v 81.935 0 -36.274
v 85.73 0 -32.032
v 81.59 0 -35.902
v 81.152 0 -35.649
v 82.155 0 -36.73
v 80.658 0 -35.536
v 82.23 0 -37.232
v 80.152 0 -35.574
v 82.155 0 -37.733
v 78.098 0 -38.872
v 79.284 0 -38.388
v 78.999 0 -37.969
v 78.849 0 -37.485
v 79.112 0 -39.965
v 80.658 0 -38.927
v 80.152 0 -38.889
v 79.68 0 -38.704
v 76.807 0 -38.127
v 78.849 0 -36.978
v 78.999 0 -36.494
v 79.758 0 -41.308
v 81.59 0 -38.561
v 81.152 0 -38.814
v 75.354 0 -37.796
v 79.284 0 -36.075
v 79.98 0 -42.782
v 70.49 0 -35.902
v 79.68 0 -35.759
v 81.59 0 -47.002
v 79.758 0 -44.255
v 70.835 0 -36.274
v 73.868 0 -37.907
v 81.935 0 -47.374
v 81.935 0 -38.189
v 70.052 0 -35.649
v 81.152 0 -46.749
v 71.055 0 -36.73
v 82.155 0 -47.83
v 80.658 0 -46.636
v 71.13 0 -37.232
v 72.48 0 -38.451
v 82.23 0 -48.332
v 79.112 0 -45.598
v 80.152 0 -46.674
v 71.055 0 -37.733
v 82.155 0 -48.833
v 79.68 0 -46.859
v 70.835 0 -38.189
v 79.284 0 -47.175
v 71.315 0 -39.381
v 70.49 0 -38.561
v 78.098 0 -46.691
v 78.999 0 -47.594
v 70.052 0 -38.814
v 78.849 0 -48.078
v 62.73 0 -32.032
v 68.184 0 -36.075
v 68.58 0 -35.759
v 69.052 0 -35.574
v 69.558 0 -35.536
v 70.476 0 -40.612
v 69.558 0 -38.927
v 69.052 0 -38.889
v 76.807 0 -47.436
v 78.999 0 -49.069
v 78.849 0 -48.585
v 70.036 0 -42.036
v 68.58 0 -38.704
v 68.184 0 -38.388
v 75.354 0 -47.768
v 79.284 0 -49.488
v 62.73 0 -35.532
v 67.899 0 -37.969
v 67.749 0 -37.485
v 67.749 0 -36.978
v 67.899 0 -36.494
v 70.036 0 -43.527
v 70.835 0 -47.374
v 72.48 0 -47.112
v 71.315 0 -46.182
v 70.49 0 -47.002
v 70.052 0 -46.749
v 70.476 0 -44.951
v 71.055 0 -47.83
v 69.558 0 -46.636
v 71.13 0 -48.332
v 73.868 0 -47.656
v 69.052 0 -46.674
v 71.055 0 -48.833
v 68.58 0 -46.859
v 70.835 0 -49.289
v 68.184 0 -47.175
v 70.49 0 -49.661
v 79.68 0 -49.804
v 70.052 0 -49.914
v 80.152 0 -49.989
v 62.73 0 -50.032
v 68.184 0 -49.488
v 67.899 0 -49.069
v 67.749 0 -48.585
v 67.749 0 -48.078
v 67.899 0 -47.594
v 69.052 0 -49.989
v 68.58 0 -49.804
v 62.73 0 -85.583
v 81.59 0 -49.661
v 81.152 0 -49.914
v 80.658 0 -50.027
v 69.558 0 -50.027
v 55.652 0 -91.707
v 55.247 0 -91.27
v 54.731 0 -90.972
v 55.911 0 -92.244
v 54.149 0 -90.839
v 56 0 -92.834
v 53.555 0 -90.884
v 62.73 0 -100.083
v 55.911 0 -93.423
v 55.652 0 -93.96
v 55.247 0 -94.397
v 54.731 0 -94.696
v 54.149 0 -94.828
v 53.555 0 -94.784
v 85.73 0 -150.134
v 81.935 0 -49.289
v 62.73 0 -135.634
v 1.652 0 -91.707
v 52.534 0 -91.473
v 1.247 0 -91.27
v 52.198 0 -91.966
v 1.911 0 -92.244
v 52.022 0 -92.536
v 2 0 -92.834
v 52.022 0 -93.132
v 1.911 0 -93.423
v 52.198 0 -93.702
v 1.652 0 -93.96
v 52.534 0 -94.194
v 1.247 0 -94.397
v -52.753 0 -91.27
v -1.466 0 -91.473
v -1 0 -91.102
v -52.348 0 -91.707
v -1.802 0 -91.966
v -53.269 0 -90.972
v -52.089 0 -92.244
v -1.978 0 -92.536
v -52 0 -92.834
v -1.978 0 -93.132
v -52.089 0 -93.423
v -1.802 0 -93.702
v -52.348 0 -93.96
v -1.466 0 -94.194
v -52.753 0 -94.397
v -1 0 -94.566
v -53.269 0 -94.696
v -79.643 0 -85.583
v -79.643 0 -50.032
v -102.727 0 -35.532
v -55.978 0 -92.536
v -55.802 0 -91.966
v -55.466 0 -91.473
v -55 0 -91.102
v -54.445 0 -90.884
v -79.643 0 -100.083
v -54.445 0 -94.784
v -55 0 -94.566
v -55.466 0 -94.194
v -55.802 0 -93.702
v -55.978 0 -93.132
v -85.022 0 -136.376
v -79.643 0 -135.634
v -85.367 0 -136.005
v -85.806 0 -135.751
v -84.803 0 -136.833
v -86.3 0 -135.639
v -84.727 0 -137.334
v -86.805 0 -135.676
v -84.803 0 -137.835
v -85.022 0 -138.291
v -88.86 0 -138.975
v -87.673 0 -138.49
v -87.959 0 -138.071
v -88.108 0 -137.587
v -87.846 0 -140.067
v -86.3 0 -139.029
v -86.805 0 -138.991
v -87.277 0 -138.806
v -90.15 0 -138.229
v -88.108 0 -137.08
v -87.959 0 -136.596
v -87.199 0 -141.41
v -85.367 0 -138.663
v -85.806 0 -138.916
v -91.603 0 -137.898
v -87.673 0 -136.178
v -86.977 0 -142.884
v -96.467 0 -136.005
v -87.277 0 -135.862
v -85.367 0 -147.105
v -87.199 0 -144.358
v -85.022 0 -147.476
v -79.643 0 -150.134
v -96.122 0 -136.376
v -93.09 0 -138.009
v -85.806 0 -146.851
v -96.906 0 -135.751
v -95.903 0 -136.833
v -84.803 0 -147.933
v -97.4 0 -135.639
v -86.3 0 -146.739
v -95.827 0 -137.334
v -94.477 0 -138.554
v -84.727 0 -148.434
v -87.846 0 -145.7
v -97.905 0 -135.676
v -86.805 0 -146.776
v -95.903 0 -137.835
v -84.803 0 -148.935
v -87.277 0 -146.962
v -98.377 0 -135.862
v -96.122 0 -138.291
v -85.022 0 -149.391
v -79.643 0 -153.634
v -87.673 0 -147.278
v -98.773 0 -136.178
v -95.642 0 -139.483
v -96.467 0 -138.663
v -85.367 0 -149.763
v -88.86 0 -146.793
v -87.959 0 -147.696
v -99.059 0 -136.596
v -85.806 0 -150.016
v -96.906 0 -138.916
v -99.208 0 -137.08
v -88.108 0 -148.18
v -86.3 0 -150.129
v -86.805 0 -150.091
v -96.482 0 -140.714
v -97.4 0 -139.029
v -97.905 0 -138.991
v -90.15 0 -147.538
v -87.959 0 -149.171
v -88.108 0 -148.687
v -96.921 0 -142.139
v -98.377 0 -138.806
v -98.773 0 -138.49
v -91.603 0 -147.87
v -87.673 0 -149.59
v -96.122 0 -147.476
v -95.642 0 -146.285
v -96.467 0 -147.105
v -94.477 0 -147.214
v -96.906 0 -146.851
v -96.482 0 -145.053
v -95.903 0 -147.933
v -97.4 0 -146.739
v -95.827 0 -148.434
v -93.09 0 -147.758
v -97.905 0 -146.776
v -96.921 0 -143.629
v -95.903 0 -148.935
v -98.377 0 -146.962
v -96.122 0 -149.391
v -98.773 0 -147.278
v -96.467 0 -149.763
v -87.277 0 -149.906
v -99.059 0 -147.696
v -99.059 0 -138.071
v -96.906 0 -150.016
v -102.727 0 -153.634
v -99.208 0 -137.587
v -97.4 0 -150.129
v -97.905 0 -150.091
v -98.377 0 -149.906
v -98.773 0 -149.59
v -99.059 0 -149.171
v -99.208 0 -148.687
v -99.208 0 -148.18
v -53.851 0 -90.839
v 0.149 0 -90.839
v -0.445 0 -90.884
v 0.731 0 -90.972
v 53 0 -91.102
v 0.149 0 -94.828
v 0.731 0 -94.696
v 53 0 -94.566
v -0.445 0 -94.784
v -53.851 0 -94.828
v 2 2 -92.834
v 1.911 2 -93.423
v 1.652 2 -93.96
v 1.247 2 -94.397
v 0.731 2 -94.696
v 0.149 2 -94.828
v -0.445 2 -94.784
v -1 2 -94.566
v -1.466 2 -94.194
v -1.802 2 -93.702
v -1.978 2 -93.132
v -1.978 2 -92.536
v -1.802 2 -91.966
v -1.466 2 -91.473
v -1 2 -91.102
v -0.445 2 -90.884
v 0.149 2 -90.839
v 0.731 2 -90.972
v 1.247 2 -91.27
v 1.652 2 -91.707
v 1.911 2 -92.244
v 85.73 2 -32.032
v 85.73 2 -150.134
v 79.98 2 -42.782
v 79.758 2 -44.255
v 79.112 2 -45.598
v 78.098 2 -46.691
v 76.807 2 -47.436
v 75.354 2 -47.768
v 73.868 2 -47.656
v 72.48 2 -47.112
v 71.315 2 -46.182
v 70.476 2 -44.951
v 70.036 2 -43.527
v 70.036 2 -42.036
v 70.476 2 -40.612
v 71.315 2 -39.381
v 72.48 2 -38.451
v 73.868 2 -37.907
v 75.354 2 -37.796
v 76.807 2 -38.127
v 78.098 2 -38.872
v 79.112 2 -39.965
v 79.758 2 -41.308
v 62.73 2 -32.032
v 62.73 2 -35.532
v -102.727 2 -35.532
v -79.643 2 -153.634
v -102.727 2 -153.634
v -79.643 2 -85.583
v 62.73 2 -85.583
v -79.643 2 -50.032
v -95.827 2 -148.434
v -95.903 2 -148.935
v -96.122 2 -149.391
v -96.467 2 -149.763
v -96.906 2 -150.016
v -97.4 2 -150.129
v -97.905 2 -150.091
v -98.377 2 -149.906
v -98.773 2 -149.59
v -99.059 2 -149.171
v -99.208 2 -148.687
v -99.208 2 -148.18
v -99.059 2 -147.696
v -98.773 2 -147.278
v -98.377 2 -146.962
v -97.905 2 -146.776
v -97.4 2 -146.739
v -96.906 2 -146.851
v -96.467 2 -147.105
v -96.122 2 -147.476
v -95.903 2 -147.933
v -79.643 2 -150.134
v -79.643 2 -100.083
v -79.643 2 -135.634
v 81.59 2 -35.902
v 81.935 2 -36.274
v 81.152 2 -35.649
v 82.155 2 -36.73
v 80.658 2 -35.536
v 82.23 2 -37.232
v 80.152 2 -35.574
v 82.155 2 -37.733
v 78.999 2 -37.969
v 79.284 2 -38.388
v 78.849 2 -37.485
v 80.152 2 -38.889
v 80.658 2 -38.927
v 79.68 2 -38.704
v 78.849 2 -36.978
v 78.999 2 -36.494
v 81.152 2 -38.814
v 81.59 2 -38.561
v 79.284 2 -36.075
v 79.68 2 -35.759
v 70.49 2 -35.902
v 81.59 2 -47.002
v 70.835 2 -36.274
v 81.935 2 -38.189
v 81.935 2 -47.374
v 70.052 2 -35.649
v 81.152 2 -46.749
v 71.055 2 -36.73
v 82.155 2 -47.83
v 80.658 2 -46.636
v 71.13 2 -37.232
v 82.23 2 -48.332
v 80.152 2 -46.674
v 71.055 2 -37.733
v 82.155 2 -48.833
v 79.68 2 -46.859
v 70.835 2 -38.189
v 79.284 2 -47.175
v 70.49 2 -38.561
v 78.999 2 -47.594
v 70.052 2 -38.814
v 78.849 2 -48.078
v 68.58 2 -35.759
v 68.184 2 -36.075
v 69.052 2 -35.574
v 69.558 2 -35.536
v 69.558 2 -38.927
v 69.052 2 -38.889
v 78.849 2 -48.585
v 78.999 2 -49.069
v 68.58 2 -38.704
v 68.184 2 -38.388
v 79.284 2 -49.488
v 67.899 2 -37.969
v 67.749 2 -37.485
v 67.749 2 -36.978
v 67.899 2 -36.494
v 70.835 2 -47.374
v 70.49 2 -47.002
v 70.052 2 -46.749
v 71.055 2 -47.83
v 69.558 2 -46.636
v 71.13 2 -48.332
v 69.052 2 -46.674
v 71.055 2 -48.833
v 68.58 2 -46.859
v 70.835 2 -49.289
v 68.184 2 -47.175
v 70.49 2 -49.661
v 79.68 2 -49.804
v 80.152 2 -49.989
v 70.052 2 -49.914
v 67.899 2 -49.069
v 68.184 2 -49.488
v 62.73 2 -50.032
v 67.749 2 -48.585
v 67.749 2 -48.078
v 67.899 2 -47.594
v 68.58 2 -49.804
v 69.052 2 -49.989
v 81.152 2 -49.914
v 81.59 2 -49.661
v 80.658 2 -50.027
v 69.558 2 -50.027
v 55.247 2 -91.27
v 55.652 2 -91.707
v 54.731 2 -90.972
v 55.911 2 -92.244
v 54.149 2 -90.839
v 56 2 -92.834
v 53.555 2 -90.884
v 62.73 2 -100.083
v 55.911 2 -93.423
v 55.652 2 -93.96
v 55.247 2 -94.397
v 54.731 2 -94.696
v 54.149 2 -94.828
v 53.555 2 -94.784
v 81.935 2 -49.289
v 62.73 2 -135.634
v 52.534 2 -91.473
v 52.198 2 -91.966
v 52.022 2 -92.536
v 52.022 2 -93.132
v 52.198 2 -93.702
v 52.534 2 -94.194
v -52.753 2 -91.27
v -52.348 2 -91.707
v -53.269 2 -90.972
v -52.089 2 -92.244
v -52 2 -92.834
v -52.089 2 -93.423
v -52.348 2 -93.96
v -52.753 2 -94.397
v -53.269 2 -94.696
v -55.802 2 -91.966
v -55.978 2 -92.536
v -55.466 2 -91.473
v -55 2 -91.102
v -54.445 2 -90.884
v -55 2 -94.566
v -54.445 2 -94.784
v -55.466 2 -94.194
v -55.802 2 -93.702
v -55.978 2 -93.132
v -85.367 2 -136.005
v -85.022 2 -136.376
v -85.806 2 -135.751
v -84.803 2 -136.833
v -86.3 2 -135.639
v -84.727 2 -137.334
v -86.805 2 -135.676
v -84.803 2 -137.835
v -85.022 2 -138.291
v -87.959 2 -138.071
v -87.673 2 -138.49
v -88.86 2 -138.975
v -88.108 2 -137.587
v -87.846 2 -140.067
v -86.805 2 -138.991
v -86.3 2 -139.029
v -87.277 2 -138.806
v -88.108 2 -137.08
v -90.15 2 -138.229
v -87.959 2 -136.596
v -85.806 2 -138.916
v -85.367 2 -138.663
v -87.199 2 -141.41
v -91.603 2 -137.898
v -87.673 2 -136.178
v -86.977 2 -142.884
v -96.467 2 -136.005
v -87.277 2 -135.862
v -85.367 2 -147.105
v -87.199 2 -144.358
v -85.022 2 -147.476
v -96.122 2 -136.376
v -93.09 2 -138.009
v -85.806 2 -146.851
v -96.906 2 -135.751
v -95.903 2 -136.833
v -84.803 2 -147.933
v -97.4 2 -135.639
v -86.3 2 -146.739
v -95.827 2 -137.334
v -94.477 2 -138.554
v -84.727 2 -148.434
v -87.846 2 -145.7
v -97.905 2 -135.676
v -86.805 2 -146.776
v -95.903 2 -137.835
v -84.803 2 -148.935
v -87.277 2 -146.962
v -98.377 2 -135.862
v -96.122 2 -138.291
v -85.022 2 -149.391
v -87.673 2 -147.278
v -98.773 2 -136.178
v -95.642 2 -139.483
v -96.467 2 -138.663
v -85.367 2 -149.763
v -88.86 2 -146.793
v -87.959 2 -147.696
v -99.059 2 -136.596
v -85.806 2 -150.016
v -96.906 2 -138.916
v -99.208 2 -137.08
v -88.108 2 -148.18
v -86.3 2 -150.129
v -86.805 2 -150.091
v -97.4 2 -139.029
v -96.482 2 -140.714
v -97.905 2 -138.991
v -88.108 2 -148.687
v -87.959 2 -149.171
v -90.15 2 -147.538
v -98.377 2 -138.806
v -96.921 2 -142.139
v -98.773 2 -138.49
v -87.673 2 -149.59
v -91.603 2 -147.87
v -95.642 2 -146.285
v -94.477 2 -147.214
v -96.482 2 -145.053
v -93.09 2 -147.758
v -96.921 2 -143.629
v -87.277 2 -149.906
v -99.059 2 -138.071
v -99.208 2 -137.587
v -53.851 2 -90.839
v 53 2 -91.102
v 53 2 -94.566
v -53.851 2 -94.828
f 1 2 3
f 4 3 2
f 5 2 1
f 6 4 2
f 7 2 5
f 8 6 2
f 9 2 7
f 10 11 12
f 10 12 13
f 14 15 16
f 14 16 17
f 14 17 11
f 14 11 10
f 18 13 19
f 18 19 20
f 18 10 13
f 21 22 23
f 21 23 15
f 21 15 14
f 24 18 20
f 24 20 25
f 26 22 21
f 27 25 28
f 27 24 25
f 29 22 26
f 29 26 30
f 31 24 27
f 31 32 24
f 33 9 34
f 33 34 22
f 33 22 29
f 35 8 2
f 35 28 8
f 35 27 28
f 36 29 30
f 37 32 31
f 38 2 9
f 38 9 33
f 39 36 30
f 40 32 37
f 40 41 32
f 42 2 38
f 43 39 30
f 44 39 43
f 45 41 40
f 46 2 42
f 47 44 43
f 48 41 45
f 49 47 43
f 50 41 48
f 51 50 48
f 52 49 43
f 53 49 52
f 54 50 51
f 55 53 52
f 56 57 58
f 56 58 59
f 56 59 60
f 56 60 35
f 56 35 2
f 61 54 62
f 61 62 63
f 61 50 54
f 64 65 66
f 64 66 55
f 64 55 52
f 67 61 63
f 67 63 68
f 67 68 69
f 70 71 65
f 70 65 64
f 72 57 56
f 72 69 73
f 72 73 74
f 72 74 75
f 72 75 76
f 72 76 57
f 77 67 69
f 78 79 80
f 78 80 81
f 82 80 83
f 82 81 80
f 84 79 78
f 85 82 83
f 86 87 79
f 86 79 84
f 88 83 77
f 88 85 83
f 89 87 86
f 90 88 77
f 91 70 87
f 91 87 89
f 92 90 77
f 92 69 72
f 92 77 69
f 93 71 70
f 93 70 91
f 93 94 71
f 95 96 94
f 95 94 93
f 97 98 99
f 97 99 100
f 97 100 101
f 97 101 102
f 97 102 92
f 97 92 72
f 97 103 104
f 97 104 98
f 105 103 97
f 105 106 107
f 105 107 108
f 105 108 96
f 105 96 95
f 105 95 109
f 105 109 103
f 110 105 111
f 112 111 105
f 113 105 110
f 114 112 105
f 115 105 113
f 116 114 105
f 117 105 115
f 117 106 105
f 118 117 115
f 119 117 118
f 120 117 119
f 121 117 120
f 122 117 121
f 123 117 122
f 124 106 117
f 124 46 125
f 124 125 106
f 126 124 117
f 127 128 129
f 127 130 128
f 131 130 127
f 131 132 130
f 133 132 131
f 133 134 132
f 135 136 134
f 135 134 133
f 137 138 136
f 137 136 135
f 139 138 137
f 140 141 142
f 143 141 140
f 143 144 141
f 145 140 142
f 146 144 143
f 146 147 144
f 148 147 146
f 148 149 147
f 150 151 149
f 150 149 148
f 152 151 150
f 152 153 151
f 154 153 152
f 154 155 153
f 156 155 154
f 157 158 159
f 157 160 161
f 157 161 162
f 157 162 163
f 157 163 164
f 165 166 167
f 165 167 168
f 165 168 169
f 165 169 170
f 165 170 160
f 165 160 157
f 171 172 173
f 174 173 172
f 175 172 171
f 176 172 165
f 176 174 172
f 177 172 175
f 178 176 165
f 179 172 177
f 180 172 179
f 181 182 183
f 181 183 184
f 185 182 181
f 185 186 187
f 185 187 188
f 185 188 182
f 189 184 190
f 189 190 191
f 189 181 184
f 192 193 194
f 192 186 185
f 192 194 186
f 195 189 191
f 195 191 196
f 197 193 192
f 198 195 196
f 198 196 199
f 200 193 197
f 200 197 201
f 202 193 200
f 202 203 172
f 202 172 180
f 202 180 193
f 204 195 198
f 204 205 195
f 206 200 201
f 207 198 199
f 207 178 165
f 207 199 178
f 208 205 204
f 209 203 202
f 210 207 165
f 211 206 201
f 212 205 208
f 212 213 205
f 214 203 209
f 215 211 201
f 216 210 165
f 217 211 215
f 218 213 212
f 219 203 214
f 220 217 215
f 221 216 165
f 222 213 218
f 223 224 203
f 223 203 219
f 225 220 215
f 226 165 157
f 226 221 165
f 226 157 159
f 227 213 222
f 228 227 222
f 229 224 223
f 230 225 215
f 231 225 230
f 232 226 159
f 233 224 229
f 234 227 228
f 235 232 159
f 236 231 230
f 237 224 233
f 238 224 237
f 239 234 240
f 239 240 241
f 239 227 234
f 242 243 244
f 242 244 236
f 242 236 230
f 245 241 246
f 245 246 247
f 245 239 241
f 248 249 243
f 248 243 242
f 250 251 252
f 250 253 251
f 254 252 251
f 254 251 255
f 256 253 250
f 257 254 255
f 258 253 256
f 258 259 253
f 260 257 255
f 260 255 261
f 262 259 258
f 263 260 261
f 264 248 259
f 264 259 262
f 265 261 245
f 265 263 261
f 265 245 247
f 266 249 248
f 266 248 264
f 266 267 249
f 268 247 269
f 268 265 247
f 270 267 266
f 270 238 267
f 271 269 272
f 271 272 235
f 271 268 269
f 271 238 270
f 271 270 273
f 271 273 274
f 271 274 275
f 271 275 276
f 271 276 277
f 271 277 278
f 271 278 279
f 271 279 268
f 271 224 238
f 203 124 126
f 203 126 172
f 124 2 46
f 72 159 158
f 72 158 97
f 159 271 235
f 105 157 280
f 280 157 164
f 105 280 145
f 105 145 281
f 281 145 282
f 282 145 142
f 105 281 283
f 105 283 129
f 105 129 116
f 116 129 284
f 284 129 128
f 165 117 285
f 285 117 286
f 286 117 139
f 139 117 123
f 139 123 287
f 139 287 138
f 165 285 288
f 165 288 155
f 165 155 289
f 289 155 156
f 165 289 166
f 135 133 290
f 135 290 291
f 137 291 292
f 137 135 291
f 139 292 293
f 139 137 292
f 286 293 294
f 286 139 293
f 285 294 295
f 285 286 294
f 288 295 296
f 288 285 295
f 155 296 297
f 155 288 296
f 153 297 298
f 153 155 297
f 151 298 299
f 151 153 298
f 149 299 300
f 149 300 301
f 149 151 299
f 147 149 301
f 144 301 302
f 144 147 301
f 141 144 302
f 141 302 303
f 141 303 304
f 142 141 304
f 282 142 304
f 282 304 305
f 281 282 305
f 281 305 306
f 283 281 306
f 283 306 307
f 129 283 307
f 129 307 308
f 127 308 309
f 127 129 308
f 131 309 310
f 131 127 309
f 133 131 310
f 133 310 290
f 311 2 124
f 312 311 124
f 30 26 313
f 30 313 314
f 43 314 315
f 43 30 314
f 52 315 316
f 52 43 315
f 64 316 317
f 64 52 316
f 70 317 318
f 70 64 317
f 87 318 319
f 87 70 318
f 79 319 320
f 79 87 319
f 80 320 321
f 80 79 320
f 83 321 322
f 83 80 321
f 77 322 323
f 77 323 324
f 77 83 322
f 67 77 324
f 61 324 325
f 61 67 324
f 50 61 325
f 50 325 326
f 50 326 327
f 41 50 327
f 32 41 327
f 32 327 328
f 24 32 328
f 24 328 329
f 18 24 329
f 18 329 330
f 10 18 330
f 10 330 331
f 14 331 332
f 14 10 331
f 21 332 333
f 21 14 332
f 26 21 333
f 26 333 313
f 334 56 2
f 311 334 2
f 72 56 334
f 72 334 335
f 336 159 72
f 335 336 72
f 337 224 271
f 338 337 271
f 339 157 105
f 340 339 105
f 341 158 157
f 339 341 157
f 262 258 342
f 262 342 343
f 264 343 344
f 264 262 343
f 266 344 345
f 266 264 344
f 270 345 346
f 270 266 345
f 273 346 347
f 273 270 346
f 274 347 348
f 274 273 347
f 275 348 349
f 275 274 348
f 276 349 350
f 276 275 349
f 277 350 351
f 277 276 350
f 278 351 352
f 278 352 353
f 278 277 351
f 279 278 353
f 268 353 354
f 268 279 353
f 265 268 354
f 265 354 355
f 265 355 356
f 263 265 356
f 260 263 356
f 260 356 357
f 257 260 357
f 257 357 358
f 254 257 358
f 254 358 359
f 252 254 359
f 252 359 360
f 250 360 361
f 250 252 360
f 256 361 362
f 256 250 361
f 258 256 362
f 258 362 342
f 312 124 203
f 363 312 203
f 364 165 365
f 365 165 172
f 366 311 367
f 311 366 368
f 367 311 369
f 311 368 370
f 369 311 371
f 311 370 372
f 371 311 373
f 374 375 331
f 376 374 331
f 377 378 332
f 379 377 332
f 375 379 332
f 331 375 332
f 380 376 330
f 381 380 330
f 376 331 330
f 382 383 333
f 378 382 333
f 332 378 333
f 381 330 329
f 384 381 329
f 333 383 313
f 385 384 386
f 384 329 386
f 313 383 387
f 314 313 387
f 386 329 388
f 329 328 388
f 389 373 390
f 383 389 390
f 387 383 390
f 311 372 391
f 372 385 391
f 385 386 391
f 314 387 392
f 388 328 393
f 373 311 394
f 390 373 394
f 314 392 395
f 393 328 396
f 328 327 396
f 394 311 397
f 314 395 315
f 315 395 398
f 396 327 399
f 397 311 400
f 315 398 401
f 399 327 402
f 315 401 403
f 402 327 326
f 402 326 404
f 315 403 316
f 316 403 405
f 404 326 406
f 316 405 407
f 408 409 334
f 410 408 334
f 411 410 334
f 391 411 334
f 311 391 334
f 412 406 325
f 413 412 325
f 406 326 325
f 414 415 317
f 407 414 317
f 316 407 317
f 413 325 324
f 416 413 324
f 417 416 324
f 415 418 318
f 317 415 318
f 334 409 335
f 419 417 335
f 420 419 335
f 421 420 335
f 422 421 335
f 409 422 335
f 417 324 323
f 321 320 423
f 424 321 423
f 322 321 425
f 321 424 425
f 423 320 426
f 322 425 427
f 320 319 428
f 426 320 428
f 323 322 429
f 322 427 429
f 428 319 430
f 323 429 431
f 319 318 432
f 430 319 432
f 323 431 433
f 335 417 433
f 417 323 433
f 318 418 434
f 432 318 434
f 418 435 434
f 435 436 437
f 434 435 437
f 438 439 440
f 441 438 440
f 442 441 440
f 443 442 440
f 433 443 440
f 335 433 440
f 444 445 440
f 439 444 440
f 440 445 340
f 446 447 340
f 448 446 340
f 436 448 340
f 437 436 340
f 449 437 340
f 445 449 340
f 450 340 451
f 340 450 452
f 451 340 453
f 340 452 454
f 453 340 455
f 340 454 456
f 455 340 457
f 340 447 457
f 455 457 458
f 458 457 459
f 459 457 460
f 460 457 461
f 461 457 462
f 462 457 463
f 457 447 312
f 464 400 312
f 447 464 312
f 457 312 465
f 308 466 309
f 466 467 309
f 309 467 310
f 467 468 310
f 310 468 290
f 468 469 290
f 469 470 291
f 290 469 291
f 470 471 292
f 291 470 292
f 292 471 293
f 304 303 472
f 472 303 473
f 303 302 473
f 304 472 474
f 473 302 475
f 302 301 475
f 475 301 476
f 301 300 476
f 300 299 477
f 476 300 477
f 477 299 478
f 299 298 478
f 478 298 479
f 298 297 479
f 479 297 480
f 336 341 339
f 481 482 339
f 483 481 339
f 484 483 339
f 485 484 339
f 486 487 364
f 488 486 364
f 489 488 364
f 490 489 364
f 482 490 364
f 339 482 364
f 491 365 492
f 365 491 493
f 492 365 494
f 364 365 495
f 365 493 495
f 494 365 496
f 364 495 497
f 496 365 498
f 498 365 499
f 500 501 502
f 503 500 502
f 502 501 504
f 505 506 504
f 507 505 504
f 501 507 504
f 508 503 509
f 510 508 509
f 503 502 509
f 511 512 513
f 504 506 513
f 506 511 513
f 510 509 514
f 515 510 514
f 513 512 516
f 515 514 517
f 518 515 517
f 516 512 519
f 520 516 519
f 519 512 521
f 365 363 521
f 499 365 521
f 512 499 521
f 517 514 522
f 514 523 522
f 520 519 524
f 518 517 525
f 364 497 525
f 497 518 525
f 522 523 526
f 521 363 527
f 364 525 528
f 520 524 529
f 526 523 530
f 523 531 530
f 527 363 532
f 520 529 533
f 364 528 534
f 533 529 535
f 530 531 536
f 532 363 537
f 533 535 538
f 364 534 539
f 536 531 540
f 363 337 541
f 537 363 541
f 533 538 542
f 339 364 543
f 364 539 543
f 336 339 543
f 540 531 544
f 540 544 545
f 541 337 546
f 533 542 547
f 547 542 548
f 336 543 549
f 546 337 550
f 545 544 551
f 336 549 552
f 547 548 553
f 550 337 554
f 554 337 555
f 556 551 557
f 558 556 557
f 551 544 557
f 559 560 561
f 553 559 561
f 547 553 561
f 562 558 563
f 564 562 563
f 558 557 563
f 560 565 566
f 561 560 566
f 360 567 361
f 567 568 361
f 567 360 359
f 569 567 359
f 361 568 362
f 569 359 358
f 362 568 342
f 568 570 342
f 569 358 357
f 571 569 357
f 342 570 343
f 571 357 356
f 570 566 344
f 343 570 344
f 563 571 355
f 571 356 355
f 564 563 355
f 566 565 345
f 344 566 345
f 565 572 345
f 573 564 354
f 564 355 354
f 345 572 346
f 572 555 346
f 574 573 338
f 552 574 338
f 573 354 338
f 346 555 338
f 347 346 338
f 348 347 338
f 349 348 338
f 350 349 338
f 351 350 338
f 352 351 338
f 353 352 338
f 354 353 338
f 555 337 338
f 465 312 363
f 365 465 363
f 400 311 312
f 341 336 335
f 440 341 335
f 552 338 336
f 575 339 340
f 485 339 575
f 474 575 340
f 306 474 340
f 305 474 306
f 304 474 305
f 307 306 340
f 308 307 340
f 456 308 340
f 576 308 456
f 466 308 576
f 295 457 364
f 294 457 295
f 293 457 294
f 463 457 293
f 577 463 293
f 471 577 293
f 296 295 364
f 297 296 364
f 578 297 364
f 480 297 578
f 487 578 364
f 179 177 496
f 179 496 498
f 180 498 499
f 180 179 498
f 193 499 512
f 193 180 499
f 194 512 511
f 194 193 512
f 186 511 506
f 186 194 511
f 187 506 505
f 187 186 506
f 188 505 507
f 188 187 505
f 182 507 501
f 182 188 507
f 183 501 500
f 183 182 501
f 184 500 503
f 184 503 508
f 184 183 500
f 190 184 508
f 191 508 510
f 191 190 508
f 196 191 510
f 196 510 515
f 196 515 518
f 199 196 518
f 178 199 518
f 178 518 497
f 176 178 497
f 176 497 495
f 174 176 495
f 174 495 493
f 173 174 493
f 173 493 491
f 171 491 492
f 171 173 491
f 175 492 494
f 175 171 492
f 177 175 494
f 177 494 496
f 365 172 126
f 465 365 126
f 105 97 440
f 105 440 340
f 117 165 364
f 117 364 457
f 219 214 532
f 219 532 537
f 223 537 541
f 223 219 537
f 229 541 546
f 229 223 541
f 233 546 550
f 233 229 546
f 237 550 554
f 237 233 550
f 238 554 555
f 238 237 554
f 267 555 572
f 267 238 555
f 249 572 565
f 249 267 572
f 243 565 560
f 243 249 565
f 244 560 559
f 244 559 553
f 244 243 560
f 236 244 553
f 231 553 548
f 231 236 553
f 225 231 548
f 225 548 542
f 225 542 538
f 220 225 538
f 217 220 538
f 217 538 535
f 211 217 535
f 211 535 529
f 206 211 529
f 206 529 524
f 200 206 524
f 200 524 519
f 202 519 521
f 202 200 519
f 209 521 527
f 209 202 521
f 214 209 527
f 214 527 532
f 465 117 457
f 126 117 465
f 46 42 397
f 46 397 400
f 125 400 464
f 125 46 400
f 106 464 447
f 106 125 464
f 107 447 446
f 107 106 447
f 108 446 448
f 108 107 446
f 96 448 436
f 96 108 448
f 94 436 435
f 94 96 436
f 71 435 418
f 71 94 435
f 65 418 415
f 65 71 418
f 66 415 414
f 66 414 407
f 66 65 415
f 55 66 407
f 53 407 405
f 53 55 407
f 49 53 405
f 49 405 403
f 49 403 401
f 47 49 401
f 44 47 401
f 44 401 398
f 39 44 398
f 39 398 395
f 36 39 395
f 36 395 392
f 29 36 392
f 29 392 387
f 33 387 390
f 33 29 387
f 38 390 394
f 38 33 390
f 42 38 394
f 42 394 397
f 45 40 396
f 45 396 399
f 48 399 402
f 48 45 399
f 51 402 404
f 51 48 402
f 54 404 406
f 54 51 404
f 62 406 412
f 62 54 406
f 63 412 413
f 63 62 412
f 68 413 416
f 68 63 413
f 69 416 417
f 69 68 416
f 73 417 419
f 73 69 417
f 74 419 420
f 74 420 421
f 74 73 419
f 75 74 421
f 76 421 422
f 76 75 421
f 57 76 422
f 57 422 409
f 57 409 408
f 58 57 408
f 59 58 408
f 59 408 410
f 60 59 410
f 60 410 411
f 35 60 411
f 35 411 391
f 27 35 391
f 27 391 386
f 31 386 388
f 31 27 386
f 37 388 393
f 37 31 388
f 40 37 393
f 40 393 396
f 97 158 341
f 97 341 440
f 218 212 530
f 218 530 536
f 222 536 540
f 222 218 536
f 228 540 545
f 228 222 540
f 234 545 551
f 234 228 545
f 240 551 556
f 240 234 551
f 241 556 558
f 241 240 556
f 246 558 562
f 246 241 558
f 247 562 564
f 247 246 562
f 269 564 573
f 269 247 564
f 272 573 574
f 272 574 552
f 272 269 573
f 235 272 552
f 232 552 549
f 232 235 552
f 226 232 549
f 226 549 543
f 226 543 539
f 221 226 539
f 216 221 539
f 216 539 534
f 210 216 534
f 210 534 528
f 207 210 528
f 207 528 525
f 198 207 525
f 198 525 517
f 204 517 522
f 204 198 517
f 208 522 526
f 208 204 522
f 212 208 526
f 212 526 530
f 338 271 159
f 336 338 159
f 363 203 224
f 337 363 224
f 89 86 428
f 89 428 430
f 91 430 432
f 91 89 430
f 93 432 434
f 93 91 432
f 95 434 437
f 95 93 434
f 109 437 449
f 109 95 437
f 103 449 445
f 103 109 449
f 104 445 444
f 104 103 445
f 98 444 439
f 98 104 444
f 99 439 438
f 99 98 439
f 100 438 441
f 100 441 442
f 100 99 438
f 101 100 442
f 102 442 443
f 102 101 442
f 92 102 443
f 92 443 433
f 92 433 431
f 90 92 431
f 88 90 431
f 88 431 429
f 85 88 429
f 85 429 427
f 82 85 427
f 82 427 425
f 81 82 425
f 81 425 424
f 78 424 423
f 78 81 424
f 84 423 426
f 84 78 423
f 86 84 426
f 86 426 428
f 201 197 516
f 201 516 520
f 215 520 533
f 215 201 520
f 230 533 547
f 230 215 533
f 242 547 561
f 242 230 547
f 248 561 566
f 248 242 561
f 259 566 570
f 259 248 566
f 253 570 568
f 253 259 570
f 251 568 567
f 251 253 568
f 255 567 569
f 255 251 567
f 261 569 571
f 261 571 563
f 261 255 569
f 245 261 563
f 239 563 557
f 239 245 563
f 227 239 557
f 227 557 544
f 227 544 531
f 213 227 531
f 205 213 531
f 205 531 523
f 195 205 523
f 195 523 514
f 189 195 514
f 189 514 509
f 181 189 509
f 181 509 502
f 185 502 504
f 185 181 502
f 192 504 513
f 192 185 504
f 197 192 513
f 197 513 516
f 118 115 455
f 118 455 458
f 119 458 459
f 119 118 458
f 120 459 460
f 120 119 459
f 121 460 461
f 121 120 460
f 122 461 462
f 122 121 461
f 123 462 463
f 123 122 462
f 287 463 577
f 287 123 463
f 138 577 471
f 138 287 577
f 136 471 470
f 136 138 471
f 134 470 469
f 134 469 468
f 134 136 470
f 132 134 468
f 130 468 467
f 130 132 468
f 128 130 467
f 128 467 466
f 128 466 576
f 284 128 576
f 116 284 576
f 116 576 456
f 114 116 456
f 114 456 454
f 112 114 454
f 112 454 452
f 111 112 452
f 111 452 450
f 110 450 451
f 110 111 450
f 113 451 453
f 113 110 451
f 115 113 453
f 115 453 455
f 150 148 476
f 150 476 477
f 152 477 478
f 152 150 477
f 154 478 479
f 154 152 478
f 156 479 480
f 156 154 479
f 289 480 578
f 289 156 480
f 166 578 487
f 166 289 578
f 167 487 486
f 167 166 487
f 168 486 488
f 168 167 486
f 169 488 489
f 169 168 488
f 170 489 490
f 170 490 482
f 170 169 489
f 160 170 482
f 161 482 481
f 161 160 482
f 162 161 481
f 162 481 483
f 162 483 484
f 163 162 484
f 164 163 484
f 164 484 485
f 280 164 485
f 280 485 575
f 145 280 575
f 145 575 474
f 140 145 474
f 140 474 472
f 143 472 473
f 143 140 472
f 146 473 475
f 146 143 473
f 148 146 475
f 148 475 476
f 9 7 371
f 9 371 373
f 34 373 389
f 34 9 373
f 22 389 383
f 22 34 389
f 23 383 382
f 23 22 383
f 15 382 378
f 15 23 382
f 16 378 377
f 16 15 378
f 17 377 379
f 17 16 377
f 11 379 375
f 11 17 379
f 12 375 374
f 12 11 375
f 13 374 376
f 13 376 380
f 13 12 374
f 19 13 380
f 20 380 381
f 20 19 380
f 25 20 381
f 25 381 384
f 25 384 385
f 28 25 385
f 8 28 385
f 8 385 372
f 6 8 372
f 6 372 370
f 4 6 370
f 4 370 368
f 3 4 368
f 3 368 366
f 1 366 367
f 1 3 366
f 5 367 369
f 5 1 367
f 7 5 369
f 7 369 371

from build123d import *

# Parameters (mm, degrees)
SKETCH1_R           = 5
SKETCH1_R_2         = 1.7
SKETCH1_R_3         = 2
SKETCH1_W           = 142.3736446
SKETCH1_H           = 35.551129401
SKETCH1_H_2         = 35.551129402
BOSS_EXTRUDE1_DEPTH = 2


with BuildPart() as part:
    # Sketch1 → Boss-Extrude1 (new body)
    with BuildSketch(Plane(origin=(0, 0, 0), x_dir=(1, 0, 0), z_dir=(0, 1, 0))):
        Polygon((67.730491212, 150.133829438), (82.230491212, 150.133829438), (85.730491212, 150.133829438), (85.730491212, 100.082700036), (85.730491212, 85.582700036), (85.730491212, 50.031570635), (85.730491212, 32.031570635), (67.730491212, 32.031570635), (62.730491212, 32.031570635), (62.730491212, 35.531570635), (-84.727026002, 35.531570635), (-99.227026002, 35.531570635), (-102.727026002, 35.531570635), (-102.727026002, 85.582700036), (-102.727026002, 92.832700036), (-102.727026002, 98.923608877), (-102.727026002, 100.082700036), (-102.727026002, 153.633829438), (-84.643153388, 153.633829438), (-79.643153388, 153.633829438), (-79.643153388, 153.432122466), (-79.643153388, 150.133829438), align=None)
        with Locations((-91.977026002, 142.883829438)):
            Circle(SKETCH1_R, mode=Mode.SUBTRACT)
        with Locations((74.980491212, 42.781570635)):
            Circle(SKETCH1_R, mode=Mode.SUBTRACT)
        with Locations((-86.427026002, 148.433829438)):
            Circle(SKETCH1_R_2, mode=Mode.SUBTRACT)
        with Locations((-97.527026002, 148.433829438)):
            Circle(SKETCH1_R_2, mode=Mode.SUBTRACT)
        with Locations((-86.427026002, 137.333829438)):
            Circle(SKETCH1_R_2, mode=Mode.SUBTRACT)
        with Locations((-97.527026002, 137.333829438)):
            Circle(SKETCH1_R_2, mode=Mode.SUBTRACT)
        with Locations((69.430491212, 48.331570635)):
            Circle(SKETCH1_R_2, mode=Mode.SUBTRACT)
        with Locations((80.530491212, 48.331570635)):
            Circle(SKETCH1_R_2, mode=Mode.SUBTRACT)
        with Locations((80.530491212, 37.231570635)):
            Circle(SKETCH1_R_2, mode=Mode.SUBTRACT)
        with Locations((69.430491212, 37.231570635)):
            Circle(SKETCH1_R_2, mode=Mode.SUBTRACT)
        with Locations((-54, 92.833829438)):
            Circle(SKETCH1_R_3, mode=Mode.SUBTRACT)
        with Locations((0, 92.833829438)):
            Circle(SKETCH1_R_3, mode=Mode.SUBTRACT)
        with Locations((54, 92.833829438)):
            Circle(SKETCH1_R_3, mode=Mode.SUBTRACT)
        with Locations((-8.456331088, 67.807135336)):
            Rectangle(SKETCH1_W, SKETCH1_H, mode=Mode.SUBTRACT)
        with Locations((-8.456331088, 117.858264737)):
            Rectangle(SKETCH1_W, SKETCH1_H_2, mode=Mode.SUBTRACT)
    extrude(amount=BOSS_EXTRUDE1_DEPTH)


solid = part.part
